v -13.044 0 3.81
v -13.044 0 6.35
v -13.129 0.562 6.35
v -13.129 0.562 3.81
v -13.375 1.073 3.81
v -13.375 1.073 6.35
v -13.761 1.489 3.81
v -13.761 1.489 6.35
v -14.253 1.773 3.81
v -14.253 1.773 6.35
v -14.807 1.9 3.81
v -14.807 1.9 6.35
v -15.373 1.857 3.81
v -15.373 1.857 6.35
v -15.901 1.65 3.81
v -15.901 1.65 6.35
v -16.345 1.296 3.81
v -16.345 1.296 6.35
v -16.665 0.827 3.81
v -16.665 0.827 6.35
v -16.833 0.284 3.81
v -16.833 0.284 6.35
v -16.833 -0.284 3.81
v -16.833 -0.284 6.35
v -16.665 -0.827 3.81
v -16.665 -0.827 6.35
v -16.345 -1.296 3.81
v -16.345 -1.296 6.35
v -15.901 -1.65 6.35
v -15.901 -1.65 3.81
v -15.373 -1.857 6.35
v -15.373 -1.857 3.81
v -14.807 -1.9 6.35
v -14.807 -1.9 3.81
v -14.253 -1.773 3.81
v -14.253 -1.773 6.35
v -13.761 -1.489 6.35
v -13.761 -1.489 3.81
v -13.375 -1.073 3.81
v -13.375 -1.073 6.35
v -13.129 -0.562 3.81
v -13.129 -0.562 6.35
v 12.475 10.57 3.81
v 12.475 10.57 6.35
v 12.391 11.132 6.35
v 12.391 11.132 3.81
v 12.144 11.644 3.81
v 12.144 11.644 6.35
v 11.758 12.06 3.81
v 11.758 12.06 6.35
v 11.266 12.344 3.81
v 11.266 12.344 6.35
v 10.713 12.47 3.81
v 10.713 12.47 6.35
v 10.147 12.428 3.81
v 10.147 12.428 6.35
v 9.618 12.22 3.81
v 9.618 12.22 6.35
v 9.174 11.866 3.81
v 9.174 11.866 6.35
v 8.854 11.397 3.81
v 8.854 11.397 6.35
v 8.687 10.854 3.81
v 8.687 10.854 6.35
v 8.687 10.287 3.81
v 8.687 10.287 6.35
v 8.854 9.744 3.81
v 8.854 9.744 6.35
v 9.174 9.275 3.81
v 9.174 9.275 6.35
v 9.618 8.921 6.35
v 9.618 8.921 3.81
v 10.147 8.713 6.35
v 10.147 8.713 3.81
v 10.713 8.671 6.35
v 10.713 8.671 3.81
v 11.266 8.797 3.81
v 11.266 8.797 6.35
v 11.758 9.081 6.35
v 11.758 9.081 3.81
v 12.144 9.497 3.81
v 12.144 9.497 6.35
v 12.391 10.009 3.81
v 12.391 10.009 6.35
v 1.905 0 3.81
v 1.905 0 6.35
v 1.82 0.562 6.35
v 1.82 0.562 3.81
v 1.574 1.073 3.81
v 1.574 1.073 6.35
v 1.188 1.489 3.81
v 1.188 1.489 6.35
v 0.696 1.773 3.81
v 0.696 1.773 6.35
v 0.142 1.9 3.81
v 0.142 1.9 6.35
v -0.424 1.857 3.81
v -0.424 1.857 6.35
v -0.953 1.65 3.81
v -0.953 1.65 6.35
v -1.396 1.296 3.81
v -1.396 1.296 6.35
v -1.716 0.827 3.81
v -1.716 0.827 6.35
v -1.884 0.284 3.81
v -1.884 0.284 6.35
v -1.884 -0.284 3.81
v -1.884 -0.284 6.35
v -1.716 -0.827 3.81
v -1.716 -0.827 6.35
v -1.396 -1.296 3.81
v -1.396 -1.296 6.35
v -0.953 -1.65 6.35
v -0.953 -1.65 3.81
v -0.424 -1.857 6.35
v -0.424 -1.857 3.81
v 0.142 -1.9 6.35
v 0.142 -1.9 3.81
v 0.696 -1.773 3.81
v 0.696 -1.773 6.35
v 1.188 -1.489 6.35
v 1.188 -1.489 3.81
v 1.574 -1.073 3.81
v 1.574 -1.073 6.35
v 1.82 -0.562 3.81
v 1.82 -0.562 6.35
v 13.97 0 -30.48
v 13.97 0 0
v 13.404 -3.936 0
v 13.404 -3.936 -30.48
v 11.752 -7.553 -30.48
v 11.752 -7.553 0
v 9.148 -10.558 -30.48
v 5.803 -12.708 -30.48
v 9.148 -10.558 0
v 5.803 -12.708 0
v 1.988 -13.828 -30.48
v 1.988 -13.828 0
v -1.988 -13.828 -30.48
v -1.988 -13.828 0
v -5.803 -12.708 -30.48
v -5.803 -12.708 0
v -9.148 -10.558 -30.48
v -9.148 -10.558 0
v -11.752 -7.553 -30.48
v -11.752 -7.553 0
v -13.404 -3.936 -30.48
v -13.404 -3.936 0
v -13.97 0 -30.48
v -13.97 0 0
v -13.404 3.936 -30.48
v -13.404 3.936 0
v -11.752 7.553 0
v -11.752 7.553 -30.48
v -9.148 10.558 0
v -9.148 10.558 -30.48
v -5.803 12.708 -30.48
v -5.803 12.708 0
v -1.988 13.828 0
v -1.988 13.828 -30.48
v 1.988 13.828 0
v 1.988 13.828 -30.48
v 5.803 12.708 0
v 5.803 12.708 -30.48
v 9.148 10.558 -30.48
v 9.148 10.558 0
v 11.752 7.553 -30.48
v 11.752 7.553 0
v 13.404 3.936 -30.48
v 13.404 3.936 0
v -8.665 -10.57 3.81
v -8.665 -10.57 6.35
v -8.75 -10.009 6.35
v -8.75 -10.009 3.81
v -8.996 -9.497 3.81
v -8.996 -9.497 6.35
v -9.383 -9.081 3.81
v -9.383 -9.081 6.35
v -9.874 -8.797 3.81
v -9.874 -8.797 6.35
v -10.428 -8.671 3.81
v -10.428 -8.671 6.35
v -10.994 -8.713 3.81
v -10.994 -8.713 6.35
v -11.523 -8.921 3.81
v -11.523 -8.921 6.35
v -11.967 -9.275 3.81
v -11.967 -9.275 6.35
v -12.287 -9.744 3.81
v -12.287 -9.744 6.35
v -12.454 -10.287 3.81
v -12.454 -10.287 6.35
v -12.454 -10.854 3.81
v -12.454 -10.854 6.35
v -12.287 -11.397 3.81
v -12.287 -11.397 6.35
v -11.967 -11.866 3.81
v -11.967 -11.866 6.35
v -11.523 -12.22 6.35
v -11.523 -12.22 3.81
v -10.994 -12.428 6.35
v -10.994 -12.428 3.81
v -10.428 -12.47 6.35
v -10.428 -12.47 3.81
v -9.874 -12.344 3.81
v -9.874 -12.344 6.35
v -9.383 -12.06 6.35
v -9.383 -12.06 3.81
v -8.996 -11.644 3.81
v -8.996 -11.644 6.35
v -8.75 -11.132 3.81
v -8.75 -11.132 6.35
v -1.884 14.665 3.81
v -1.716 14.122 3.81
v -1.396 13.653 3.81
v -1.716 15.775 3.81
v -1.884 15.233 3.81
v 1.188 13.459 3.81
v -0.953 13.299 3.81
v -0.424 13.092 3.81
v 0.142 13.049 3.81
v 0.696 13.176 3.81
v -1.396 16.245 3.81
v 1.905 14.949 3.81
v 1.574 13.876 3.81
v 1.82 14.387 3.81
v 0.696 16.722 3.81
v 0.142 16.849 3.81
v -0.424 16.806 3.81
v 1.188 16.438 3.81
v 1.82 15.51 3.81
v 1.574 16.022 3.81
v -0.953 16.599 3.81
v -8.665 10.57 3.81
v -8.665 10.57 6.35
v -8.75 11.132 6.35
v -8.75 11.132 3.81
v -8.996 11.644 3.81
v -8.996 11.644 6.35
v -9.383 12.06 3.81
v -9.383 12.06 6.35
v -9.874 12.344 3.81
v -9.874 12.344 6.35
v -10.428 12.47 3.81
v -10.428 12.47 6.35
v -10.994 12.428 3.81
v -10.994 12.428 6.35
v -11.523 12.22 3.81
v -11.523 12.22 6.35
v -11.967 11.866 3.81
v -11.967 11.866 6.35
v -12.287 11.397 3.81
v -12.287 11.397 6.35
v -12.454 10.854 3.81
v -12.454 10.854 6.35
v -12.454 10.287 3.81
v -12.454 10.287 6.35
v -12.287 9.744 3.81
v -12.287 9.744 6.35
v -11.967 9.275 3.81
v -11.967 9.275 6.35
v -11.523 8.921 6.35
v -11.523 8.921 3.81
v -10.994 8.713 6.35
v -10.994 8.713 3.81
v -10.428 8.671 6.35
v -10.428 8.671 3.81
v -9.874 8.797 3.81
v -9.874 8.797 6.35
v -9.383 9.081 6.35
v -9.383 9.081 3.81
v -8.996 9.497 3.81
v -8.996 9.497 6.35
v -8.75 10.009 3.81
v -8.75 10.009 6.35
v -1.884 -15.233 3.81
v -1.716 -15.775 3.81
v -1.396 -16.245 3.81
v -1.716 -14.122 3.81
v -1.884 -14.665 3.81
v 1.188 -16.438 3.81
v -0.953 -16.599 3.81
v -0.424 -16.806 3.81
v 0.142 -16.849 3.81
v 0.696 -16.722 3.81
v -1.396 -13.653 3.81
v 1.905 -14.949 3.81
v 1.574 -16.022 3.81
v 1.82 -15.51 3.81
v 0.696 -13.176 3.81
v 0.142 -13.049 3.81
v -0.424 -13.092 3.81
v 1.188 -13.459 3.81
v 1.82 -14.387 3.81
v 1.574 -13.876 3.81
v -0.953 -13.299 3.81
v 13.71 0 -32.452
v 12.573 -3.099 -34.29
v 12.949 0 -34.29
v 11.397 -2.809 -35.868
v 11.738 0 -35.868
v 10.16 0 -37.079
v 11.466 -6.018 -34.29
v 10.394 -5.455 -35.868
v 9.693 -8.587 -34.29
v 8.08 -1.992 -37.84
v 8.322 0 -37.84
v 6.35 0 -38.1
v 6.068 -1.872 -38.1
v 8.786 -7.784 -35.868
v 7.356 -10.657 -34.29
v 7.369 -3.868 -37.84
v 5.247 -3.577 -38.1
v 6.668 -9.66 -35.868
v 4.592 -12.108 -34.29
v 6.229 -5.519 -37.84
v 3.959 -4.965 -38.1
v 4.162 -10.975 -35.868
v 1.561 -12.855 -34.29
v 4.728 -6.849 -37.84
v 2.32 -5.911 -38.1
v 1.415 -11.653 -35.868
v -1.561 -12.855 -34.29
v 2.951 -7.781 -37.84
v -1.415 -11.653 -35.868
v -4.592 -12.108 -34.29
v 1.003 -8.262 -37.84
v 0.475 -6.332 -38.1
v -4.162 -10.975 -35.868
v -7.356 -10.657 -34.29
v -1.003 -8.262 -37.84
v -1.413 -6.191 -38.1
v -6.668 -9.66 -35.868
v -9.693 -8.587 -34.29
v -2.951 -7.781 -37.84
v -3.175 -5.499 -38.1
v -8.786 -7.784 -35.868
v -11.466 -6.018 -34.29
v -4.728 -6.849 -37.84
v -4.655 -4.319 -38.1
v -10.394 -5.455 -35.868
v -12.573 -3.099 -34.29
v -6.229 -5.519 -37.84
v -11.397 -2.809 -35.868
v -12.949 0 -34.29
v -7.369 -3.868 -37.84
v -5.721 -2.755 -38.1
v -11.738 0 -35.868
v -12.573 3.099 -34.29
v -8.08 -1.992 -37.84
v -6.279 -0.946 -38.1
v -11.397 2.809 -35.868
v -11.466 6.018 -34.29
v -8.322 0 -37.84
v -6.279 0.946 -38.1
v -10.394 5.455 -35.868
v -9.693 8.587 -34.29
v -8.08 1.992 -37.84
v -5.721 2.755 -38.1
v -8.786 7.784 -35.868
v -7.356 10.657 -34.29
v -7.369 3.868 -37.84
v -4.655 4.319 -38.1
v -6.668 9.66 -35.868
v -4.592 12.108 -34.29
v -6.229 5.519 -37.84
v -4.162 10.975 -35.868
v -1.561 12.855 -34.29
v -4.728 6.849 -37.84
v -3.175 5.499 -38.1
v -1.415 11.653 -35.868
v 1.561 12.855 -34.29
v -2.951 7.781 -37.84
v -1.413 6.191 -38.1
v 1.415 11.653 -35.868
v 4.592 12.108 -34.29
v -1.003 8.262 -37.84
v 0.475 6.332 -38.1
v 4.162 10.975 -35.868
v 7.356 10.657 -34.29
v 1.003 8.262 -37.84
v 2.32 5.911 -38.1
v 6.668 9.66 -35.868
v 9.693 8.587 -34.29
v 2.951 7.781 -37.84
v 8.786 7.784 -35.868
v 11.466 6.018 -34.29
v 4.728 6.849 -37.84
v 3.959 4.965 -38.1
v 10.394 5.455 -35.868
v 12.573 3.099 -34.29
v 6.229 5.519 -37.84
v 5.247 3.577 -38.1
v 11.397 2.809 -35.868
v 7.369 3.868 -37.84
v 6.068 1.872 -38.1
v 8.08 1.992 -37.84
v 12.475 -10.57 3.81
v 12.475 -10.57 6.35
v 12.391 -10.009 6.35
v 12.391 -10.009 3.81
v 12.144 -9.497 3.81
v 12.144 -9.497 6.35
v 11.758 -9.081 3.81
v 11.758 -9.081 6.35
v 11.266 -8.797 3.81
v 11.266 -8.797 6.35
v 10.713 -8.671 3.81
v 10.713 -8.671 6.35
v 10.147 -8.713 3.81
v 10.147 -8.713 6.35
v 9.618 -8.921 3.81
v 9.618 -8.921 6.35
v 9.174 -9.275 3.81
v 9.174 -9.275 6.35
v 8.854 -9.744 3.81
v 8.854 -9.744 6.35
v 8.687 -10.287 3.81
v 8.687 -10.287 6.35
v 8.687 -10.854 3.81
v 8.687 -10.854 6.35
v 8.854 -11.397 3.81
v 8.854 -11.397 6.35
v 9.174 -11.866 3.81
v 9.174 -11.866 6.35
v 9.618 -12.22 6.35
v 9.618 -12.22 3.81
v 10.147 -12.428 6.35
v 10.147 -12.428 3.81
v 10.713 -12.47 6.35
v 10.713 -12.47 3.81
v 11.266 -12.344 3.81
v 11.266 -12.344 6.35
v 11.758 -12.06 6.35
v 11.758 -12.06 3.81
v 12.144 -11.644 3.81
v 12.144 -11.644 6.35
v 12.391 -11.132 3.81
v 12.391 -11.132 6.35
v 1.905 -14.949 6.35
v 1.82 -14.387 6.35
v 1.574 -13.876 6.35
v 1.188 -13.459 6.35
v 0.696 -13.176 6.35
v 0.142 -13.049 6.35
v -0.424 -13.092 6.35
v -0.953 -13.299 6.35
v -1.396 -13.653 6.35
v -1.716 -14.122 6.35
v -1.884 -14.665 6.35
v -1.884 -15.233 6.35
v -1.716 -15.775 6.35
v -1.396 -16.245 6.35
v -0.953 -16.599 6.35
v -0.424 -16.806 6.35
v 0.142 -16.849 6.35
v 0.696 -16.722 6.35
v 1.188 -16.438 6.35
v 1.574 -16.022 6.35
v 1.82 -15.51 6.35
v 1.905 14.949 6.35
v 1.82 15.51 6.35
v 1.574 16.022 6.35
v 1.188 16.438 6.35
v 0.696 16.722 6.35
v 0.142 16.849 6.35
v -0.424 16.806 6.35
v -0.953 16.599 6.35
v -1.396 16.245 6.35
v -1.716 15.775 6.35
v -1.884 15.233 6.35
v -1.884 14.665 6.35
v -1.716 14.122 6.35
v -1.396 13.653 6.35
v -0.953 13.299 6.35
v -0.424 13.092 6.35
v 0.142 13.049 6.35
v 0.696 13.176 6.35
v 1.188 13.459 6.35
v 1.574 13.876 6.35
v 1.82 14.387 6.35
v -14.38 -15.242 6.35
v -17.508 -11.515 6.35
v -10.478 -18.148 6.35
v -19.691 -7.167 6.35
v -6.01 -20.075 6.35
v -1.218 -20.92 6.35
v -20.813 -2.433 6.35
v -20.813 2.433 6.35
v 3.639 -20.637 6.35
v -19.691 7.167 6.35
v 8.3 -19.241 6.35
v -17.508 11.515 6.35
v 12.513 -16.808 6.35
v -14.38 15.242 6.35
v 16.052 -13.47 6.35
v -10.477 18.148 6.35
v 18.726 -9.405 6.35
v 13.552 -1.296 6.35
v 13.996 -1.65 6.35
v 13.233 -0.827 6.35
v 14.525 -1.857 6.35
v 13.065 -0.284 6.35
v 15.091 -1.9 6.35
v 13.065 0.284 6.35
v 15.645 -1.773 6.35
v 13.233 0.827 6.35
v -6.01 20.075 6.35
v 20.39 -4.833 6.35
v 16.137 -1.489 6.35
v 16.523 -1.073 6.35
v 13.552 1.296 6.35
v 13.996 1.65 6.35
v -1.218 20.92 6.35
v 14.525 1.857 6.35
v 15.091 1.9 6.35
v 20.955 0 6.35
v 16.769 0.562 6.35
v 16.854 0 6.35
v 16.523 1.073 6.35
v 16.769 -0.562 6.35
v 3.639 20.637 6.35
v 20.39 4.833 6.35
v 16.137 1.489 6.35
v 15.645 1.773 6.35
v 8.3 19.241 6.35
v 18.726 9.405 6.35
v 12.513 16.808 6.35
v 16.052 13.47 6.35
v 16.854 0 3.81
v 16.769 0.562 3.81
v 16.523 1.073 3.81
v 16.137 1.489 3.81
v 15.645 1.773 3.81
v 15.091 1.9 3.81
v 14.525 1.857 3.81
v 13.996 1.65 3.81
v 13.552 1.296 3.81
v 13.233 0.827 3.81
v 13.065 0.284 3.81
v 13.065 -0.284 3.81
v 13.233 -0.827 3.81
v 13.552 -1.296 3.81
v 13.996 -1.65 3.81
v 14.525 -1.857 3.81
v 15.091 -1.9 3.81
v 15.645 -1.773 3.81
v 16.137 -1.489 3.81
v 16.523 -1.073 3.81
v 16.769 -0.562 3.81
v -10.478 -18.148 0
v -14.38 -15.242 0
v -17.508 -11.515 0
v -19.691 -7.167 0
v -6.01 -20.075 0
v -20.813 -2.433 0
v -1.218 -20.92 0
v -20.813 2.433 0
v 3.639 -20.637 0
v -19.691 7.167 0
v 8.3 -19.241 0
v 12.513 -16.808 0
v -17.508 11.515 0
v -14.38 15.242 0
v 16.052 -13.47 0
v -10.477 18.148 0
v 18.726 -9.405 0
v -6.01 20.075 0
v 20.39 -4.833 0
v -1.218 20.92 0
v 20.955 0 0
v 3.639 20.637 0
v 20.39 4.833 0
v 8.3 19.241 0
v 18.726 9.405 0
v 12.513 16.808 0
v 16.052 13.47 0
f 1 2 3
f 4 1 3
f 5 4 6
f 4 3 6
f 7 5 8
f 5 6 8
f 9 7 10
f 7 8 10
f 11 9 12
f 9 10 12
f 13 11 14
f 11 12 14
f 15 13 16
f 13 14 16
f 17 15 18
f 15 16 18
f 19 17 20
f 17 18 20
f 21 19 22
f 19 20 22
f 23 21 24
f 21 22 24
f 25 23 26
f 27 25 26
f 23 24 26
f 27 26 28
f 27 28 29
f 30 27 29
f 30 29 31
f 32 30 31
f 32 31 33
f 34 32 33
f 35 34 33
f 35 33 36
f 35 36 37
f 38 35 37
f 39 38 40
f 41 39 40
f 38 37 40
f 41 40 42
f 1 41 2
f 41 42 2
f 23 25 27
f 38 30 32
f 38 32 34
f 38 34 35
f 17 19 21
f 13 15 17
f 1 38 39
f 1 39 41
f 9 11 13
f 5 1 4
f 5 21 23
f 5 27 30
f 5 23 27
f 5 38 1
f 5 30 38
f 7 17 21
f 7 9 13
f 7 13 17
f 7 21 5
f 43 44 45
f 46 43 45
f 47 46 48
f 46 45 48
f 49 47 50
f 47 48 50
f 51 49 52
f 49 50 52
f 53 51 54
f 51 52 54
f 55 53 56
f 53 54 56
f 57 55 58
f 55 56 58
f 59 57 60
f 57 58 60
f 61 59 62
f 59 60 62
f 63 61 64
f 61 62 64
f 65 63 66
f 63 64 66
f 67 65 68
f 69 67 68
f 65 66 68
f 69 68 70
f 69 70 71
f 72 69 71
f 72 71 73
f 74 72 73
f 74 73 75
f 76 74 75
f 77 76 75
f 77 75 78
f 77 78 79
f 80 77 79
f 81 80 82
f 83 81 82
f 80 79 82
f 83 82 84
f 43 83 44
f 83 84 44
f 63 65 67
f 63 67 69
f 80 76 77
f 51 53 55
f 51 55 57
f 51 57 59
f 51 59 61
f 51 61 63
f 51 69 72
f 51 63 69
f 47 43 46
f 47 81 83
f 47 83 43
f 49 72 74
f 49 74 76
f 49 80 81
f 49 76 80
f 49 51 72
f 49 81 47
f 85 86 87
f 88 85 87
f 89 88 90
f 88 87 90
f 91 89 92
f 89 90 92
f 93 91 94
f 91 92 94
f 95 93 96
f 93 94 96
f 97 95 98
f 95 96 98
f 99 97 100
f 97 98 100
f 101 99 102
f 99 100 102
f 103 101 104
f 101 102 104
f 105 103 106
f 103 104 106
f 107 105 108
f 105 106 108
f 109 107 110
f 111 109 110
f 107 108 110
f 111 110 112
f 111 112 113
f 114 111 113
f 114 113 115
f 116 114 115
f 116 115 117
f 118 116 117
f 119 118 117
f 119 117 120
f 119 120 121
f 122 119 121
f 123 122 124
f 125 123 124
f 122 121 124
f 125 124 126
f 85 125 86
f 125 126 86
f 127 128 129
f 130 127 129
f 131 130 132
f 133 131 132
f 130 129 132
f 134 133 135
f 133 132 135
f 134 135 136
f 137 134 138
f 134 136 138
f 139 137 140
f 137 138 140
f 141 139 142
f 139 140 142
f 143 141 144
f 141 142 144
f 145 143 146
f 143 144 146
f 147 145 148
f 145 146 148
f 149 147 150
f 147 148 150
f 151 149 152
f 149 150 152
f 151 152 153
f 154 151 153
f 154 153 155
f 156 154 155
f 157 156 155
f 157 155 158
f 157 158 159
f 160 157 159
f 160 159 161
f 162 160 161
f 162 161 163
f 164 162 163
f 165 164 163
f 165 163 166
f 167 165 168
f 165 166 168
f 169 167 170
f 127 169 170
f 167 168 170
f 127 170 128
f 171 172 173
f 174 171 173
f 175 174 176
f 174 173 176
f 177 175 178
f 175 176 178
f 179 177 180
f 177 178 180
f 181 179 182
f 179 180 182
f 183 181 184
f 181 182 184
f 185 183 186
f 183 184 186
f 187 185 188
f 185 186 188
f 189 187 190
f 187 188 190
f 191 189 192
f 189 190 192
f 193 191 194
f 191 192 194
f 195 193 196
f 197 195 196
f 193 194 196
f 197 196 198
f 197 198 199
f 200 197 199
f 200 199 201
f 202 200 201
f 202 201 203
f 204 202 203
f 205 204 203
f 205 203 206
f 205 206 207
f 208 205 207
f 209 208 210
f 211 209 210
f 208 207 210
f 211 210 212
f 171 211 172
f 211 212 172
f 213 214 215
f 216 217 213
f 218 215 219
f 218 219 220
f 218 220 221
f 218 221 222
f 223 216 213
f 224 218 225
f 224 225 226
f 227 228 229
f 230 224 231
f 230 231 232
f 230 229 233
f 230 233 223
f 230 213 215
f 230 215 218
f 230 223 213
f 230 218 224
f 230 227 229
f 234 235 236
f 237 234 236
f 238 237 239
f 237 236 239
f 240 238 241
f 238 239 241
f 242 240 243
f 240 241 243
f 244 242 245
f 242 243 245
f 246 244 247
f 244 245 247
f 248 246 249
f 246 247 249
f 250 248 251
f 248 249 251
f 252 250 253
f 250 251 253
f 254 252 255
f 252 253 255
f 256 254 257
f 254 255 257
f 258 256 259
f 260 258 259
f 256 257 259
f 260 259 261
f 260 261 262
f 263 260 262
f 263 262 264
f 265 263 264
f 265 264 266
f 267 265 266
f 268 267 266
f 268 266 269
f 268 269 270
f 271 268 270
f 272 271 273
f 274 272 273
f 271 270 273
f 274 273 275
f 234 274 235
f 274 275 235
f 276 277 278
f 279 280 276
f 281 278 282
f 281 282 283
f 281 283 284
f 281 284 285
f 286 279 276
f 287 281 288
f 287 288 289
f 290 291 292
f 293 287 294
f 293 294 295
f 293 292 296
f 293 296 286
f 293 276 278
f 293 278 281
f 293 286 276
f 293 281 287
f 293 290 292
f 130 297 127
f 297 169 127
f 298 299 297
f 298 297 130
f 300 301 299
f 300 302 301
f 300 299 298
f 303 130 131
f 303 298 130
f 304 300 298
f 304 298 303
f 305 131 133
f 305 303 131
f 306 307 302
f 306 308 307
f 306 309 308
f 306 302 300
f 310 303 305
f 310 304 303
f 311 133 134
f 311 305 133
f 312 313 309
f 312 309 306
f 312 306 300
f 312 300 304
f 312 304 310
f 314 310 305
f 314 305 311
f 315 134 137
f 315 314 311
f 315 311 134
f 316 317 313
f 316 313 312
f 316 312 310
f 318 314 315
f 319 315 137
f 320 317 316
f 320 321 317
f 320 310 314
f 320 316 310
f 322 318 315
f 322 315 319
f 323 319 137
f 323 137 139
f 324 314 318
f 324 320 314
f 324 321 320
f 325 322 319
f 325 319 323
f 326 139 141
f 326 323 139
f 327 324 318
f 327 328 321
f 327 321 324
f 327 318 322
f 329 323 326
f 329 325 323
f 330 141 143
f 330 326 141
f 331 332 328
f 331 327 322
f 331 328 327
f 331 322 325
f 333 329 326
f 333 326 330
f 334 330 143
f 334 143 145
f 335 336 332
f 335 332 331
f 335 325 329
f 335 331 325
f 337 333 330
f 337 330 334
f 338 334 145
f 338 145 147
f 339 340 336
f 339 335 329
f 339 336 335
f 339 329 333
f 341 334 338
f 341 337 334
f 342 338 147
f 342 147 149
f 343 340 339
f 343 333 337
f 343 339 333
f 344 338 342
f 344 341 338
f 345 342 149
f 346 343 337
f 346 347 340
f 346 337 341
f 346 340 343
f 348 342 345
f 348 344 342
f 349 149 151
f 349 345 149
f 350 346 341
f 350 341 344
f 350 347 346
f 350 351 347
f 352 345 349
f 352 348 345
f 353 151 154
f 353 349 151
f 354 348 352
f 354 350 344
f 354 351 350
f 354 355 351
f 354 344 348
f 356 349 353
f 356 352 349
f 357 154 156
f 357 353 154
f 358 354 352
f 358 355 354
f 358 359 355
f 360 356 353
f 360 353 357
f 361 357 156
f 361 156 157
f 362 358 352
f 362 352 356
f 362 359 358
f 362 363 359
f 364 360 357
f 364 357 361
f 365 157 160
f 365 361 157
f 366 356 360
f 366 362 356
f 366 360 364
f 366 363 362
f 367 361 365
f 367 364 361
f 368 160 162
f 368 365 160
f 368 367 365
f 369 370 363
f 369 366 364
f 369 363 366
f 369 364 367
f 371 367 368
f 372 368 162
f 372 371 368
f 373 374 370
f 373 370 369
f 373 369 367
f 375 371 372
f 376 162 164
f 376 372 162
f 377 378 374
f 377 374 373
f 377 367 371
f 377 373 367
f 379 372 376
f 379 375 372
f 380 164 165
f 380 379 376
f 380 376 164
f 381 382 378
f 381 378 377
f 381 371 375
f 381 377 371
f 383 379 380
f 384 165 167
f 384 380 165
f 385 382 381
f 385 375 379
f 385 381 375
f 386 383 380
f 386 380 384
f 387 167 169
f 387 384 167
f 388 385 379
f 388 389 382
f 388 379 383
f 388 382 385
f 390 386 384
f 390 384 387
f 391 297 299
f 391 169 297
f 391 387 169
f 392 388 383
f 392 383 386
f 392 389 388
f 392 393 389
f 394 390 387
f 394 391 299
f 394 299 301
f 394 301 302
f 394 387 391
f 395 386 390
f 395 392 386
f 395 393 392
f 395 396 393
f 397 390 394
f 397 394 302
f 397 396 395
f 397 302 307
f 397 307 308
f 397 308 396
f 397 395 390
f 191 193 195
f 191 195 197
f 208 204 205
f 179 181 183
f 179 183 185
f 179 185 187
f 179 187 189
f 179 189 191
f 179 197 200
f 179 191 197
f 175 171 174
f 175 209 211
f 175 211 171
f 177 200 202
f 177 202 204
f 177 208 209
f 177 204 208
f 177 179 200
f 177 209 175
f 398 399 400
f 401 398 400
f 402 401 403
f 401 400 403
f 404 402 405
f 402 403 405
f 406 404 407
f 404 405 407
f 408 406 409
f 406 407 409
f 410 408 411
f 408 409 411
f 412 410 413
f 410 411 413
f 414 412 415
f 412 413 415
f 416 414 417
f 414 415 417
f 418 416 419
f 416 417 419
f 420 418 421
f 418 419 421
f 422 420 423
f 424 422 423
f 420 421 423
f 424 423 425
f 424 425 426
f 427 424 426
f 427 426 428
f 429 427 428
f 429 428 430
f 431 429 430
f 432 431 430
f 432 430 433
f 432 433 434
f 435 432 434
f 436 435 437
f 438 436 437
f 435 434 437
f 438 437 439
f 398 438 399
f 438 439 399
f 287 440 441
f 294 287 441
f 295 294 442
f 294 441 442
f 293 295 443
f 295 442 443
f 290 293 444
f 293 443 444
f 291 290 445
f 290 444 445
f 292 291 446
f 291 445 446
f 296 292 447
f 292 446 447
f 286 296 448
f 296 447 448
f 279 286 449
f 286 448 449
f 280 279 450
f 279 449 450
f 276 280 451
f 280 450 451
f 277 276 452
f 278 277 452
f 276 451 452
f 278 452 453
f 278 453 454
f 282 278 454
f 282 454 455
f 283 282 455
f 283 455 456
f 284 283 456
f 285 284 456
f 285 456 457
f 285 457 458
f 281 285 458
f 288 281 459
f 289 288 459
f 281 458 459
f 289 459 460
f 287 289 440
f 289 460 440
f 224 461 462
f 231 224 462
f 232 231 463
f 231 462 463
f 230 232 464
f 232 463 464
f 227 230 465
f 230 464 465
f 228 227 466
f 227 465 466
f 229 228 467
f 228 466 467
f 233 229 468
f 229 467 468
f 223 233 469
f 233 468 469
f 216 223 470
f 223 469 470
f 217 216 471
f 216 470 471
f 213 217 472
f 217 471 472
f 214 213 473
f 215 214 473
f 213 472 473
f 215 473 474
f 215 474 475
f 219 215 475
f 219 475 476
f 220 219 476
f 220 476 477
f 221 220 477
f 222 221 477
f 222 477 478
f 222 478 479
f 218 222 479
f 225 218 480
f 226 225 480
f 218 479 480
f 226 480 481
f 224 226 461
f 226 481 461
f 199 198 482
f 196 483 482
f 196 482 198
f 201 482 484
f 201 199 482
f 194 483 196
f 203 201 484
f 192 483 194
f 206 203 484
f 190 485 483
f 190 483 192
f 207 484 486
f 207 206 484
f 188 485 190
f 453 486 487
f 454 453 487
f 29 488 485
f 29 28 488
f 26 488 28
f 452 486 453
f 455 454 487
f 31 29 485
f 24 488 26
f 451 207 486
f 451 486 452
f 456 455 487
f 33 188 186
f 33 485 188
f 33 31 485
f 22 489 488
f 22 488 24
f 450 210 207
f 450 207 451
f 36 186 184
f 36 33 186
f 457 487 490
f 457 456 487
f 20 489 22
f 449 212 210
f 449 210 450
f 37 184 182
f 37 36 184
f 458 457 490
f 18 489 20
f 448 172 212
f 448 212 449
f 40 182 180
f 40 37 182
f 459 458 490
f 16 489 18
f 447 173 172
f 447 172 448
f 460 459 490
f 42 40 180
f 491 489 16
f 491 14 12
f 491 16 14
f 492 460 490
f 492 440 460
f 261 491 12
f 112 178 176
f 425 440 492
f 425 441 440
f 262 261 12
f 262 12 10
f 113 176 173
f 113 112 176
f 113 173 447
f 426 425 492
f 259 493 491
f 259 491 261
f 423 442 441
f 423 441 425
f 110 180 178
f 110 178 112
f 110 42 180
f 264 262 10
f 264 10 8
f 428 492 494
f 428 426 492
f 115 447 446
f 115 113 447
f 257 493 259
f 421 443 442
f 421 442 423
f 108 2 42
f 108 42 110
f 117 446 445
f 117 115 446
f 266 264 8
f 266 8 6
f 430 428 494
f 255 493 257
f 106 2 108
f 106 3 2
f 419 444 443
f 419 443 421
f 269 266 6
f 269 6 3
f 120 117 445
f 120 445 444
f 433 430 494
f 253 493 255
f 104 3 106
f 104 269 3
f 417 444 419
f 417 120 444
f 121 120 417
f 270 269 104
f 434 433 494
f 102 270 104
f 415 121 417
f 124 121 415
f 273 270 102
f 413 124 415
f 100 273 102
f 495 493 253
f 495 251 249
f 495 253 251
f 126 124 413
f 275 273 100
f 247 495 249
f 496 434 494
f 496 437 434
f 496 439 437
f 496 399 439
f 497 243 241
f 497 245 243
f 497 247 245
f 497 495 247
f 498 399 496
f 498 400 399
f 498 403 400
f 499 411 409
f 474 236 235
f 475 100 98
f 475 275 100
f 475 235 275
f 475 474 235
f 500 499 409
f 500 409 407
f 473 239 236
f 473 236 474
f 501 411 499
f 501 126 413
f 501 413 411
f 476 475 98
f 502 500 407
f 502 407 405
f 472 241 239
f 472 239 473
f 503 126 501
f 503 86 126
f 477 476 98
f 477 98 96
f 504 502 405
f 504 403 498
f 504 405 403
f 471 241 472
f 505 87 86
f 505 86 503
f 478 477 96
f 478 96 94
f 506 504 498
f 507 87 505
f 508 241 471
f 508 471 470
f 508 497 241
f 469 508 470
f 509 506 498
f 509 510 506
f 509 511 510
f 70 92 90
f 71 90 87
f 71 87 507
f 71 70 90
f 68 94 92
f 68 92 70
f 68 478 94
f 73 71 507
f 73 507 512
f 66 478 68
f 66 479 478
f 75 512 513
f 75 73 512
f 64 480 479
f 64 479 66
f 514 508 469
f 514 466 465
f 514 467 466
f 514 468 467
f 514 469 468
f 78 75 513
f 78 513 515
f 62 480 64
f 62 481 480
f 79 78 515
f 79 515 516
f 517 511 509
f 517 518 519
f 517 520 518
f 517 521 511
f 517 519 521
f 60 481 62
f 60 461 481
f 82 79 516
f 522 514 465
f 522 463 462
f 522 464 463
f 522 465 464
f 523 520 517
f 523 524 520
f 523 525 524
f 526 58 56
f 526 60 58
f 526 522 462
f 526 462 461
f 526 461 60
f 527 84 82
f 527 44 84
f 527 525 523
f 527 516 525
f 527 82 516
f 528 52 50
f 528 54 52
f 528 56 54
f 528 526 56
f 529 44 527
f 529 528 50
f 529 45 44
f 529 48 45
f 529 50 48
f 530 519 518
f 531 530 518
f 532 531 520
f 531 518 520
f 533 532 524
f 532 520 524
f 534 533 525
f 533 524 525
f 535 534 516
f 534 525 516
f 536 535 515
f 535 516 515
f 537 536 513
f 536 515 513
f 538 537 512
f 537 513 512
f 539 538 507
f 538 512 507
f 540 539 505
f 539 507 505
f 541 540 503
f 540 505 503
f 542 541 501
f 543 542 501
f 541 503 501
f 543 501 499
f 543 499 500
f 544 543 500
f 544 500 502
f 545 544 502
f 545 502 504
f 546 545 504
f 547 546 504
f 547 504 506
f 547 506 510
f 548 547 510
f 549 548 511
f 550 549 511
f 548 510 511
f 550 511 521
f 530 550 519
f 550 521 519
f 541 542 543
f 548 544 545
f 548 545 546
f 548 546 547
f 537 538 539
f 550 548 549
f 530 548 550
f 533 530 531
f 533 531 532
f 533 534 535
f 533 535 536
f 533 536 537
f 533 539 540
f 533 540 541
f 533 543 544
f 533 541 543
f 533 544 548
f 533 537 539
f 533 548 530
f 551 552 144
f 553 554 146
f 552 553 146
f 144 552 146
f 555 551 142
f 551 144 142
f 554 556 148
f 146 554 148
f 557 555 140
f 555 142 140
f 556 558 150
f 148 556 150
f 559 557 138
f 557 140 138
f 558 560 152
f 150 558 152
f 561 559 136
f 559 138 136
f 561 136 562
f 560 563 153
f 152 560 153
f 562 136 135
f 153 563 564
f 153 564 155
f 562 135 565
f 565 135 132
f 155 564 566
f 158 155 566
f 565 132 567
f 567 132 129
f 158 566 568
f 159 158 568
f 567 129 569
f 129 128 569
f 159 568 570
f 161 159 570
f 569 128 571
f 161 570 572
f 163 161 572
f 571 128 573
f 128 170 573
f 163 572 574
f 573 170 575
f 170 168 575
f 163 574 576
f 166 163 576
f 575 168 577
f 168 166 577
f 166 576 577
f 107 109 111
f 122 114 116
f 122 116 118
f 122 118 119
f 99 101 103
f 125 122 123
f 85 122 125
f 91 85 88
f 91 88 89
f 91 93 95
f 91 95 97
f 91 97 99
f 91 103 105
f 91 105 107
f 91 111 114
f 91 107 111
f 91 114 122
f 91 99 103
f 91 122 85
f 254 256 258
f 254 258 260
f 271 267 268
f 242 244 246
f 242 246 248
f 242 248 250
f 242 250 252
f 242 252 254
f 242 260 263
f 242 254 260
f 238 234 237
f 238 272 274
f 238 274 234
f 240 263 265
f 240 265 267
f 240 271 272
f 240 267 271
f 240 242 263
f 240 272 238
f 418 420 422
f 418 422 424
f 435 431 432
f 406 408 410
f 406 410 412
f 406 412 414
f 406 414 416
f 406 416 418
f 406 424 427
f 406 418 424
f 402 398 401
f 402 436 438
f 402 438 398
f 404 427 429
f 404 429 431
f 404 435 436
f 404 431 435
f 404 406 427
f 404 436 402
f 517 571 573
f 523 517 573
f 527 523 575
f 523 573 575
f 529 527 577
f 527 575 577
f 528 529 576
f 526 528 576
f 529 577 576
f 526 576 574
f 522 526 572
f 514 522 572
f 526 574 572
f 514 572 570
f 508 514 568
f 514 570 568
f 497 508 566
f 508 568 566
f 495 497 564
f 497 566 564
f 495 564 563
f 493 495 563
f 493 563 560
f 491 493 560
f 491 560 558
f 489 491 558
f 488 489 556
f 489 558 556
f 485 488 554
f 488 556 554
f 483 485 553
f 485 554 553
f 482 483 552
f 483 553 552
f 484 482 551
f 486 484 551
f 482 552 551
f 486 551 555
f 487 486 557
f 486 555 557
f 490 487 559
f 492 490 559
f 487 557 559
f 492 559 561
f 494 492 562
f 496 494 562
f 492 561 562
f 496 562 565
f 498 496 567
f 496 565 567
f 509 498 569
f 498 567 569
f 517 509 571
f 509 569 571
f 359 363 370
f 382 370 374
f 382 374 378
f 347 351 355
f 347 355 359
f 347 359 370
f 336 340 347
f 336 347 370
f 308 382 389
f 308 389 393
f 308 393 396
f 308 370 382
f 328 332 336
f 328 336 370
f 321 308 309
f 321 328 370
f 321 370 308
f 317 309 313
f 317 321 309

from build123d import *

# Parameters (mm, degrees)
F0_R     = 20.955
F1_DEPTH = 6.35
F3_R     = 13.97
F4_DEPTH = 38.1
F5_R     = 7.62
F2_R     = 1.905
F7_DEPTH = 2.54
F6_R     = 1.905
F8_DEPTH = 2.54


with BuildPart() as f1:
    # F0 (on Top) → F1 (new body)
    with BuildSketch(Plane.XY):
        Circle(F0_R)
    extrude(amount=F1_DEPTH)

    # F3 (on face) → F4 (join)
    with BuildSketch(Plane(origin=(0, 0, 0), x_dir=(1, 0, 0), z_dir=(0, 0, -1))):
        Circle(F3_R)
    extrude(amount=F4_DEPTH)

    # F5
    f5_edges = [f1.edges().sort_by_distance(p)[0] for p in [
        (-13.97, 0, -38.1),
    ]]
    fillet(f5_edges, radius=F5_R)

    # F2 (on face) → F7 (cut)
    with BuildSketch(Plane.XY.offset(6.35)):
        with Locations((10.57046, -10.57046)):
            Circle(F2_R)
    extrude(amount=-F7_DEPTH, mode=Mode.SUBTRACT)

    # F6 (on face) → F8 (cut)
    with BuildSketch(Plane.XY.offset(6.35)):
        with Locations((-10.57046, -10.57046)):
            Circle(F6_R)
        with Locations((10.57046, 10.57046)):
            Circle(F6_R)
        with Locations((-10.57046, 10.57046)):
            Circle(F6_R)
        Circle(F6_R)
        with Locations((0, 14.948888)):
            Circle(F6_R)
        with Locations((14.948888, 0)):
            Circle(F6_R)
        with Locations((0, -14.948888)):
            Circle(F6_R)
        with Locations((10.57046, -10.57046)):
            Circle(F6_R)
        with Locations((-14.948888, 0)):
            Circle(F6_R)
    extrude(amount=-F8_DEPTH, mode=Mode.SUBTRACT)


solid = f1.part
